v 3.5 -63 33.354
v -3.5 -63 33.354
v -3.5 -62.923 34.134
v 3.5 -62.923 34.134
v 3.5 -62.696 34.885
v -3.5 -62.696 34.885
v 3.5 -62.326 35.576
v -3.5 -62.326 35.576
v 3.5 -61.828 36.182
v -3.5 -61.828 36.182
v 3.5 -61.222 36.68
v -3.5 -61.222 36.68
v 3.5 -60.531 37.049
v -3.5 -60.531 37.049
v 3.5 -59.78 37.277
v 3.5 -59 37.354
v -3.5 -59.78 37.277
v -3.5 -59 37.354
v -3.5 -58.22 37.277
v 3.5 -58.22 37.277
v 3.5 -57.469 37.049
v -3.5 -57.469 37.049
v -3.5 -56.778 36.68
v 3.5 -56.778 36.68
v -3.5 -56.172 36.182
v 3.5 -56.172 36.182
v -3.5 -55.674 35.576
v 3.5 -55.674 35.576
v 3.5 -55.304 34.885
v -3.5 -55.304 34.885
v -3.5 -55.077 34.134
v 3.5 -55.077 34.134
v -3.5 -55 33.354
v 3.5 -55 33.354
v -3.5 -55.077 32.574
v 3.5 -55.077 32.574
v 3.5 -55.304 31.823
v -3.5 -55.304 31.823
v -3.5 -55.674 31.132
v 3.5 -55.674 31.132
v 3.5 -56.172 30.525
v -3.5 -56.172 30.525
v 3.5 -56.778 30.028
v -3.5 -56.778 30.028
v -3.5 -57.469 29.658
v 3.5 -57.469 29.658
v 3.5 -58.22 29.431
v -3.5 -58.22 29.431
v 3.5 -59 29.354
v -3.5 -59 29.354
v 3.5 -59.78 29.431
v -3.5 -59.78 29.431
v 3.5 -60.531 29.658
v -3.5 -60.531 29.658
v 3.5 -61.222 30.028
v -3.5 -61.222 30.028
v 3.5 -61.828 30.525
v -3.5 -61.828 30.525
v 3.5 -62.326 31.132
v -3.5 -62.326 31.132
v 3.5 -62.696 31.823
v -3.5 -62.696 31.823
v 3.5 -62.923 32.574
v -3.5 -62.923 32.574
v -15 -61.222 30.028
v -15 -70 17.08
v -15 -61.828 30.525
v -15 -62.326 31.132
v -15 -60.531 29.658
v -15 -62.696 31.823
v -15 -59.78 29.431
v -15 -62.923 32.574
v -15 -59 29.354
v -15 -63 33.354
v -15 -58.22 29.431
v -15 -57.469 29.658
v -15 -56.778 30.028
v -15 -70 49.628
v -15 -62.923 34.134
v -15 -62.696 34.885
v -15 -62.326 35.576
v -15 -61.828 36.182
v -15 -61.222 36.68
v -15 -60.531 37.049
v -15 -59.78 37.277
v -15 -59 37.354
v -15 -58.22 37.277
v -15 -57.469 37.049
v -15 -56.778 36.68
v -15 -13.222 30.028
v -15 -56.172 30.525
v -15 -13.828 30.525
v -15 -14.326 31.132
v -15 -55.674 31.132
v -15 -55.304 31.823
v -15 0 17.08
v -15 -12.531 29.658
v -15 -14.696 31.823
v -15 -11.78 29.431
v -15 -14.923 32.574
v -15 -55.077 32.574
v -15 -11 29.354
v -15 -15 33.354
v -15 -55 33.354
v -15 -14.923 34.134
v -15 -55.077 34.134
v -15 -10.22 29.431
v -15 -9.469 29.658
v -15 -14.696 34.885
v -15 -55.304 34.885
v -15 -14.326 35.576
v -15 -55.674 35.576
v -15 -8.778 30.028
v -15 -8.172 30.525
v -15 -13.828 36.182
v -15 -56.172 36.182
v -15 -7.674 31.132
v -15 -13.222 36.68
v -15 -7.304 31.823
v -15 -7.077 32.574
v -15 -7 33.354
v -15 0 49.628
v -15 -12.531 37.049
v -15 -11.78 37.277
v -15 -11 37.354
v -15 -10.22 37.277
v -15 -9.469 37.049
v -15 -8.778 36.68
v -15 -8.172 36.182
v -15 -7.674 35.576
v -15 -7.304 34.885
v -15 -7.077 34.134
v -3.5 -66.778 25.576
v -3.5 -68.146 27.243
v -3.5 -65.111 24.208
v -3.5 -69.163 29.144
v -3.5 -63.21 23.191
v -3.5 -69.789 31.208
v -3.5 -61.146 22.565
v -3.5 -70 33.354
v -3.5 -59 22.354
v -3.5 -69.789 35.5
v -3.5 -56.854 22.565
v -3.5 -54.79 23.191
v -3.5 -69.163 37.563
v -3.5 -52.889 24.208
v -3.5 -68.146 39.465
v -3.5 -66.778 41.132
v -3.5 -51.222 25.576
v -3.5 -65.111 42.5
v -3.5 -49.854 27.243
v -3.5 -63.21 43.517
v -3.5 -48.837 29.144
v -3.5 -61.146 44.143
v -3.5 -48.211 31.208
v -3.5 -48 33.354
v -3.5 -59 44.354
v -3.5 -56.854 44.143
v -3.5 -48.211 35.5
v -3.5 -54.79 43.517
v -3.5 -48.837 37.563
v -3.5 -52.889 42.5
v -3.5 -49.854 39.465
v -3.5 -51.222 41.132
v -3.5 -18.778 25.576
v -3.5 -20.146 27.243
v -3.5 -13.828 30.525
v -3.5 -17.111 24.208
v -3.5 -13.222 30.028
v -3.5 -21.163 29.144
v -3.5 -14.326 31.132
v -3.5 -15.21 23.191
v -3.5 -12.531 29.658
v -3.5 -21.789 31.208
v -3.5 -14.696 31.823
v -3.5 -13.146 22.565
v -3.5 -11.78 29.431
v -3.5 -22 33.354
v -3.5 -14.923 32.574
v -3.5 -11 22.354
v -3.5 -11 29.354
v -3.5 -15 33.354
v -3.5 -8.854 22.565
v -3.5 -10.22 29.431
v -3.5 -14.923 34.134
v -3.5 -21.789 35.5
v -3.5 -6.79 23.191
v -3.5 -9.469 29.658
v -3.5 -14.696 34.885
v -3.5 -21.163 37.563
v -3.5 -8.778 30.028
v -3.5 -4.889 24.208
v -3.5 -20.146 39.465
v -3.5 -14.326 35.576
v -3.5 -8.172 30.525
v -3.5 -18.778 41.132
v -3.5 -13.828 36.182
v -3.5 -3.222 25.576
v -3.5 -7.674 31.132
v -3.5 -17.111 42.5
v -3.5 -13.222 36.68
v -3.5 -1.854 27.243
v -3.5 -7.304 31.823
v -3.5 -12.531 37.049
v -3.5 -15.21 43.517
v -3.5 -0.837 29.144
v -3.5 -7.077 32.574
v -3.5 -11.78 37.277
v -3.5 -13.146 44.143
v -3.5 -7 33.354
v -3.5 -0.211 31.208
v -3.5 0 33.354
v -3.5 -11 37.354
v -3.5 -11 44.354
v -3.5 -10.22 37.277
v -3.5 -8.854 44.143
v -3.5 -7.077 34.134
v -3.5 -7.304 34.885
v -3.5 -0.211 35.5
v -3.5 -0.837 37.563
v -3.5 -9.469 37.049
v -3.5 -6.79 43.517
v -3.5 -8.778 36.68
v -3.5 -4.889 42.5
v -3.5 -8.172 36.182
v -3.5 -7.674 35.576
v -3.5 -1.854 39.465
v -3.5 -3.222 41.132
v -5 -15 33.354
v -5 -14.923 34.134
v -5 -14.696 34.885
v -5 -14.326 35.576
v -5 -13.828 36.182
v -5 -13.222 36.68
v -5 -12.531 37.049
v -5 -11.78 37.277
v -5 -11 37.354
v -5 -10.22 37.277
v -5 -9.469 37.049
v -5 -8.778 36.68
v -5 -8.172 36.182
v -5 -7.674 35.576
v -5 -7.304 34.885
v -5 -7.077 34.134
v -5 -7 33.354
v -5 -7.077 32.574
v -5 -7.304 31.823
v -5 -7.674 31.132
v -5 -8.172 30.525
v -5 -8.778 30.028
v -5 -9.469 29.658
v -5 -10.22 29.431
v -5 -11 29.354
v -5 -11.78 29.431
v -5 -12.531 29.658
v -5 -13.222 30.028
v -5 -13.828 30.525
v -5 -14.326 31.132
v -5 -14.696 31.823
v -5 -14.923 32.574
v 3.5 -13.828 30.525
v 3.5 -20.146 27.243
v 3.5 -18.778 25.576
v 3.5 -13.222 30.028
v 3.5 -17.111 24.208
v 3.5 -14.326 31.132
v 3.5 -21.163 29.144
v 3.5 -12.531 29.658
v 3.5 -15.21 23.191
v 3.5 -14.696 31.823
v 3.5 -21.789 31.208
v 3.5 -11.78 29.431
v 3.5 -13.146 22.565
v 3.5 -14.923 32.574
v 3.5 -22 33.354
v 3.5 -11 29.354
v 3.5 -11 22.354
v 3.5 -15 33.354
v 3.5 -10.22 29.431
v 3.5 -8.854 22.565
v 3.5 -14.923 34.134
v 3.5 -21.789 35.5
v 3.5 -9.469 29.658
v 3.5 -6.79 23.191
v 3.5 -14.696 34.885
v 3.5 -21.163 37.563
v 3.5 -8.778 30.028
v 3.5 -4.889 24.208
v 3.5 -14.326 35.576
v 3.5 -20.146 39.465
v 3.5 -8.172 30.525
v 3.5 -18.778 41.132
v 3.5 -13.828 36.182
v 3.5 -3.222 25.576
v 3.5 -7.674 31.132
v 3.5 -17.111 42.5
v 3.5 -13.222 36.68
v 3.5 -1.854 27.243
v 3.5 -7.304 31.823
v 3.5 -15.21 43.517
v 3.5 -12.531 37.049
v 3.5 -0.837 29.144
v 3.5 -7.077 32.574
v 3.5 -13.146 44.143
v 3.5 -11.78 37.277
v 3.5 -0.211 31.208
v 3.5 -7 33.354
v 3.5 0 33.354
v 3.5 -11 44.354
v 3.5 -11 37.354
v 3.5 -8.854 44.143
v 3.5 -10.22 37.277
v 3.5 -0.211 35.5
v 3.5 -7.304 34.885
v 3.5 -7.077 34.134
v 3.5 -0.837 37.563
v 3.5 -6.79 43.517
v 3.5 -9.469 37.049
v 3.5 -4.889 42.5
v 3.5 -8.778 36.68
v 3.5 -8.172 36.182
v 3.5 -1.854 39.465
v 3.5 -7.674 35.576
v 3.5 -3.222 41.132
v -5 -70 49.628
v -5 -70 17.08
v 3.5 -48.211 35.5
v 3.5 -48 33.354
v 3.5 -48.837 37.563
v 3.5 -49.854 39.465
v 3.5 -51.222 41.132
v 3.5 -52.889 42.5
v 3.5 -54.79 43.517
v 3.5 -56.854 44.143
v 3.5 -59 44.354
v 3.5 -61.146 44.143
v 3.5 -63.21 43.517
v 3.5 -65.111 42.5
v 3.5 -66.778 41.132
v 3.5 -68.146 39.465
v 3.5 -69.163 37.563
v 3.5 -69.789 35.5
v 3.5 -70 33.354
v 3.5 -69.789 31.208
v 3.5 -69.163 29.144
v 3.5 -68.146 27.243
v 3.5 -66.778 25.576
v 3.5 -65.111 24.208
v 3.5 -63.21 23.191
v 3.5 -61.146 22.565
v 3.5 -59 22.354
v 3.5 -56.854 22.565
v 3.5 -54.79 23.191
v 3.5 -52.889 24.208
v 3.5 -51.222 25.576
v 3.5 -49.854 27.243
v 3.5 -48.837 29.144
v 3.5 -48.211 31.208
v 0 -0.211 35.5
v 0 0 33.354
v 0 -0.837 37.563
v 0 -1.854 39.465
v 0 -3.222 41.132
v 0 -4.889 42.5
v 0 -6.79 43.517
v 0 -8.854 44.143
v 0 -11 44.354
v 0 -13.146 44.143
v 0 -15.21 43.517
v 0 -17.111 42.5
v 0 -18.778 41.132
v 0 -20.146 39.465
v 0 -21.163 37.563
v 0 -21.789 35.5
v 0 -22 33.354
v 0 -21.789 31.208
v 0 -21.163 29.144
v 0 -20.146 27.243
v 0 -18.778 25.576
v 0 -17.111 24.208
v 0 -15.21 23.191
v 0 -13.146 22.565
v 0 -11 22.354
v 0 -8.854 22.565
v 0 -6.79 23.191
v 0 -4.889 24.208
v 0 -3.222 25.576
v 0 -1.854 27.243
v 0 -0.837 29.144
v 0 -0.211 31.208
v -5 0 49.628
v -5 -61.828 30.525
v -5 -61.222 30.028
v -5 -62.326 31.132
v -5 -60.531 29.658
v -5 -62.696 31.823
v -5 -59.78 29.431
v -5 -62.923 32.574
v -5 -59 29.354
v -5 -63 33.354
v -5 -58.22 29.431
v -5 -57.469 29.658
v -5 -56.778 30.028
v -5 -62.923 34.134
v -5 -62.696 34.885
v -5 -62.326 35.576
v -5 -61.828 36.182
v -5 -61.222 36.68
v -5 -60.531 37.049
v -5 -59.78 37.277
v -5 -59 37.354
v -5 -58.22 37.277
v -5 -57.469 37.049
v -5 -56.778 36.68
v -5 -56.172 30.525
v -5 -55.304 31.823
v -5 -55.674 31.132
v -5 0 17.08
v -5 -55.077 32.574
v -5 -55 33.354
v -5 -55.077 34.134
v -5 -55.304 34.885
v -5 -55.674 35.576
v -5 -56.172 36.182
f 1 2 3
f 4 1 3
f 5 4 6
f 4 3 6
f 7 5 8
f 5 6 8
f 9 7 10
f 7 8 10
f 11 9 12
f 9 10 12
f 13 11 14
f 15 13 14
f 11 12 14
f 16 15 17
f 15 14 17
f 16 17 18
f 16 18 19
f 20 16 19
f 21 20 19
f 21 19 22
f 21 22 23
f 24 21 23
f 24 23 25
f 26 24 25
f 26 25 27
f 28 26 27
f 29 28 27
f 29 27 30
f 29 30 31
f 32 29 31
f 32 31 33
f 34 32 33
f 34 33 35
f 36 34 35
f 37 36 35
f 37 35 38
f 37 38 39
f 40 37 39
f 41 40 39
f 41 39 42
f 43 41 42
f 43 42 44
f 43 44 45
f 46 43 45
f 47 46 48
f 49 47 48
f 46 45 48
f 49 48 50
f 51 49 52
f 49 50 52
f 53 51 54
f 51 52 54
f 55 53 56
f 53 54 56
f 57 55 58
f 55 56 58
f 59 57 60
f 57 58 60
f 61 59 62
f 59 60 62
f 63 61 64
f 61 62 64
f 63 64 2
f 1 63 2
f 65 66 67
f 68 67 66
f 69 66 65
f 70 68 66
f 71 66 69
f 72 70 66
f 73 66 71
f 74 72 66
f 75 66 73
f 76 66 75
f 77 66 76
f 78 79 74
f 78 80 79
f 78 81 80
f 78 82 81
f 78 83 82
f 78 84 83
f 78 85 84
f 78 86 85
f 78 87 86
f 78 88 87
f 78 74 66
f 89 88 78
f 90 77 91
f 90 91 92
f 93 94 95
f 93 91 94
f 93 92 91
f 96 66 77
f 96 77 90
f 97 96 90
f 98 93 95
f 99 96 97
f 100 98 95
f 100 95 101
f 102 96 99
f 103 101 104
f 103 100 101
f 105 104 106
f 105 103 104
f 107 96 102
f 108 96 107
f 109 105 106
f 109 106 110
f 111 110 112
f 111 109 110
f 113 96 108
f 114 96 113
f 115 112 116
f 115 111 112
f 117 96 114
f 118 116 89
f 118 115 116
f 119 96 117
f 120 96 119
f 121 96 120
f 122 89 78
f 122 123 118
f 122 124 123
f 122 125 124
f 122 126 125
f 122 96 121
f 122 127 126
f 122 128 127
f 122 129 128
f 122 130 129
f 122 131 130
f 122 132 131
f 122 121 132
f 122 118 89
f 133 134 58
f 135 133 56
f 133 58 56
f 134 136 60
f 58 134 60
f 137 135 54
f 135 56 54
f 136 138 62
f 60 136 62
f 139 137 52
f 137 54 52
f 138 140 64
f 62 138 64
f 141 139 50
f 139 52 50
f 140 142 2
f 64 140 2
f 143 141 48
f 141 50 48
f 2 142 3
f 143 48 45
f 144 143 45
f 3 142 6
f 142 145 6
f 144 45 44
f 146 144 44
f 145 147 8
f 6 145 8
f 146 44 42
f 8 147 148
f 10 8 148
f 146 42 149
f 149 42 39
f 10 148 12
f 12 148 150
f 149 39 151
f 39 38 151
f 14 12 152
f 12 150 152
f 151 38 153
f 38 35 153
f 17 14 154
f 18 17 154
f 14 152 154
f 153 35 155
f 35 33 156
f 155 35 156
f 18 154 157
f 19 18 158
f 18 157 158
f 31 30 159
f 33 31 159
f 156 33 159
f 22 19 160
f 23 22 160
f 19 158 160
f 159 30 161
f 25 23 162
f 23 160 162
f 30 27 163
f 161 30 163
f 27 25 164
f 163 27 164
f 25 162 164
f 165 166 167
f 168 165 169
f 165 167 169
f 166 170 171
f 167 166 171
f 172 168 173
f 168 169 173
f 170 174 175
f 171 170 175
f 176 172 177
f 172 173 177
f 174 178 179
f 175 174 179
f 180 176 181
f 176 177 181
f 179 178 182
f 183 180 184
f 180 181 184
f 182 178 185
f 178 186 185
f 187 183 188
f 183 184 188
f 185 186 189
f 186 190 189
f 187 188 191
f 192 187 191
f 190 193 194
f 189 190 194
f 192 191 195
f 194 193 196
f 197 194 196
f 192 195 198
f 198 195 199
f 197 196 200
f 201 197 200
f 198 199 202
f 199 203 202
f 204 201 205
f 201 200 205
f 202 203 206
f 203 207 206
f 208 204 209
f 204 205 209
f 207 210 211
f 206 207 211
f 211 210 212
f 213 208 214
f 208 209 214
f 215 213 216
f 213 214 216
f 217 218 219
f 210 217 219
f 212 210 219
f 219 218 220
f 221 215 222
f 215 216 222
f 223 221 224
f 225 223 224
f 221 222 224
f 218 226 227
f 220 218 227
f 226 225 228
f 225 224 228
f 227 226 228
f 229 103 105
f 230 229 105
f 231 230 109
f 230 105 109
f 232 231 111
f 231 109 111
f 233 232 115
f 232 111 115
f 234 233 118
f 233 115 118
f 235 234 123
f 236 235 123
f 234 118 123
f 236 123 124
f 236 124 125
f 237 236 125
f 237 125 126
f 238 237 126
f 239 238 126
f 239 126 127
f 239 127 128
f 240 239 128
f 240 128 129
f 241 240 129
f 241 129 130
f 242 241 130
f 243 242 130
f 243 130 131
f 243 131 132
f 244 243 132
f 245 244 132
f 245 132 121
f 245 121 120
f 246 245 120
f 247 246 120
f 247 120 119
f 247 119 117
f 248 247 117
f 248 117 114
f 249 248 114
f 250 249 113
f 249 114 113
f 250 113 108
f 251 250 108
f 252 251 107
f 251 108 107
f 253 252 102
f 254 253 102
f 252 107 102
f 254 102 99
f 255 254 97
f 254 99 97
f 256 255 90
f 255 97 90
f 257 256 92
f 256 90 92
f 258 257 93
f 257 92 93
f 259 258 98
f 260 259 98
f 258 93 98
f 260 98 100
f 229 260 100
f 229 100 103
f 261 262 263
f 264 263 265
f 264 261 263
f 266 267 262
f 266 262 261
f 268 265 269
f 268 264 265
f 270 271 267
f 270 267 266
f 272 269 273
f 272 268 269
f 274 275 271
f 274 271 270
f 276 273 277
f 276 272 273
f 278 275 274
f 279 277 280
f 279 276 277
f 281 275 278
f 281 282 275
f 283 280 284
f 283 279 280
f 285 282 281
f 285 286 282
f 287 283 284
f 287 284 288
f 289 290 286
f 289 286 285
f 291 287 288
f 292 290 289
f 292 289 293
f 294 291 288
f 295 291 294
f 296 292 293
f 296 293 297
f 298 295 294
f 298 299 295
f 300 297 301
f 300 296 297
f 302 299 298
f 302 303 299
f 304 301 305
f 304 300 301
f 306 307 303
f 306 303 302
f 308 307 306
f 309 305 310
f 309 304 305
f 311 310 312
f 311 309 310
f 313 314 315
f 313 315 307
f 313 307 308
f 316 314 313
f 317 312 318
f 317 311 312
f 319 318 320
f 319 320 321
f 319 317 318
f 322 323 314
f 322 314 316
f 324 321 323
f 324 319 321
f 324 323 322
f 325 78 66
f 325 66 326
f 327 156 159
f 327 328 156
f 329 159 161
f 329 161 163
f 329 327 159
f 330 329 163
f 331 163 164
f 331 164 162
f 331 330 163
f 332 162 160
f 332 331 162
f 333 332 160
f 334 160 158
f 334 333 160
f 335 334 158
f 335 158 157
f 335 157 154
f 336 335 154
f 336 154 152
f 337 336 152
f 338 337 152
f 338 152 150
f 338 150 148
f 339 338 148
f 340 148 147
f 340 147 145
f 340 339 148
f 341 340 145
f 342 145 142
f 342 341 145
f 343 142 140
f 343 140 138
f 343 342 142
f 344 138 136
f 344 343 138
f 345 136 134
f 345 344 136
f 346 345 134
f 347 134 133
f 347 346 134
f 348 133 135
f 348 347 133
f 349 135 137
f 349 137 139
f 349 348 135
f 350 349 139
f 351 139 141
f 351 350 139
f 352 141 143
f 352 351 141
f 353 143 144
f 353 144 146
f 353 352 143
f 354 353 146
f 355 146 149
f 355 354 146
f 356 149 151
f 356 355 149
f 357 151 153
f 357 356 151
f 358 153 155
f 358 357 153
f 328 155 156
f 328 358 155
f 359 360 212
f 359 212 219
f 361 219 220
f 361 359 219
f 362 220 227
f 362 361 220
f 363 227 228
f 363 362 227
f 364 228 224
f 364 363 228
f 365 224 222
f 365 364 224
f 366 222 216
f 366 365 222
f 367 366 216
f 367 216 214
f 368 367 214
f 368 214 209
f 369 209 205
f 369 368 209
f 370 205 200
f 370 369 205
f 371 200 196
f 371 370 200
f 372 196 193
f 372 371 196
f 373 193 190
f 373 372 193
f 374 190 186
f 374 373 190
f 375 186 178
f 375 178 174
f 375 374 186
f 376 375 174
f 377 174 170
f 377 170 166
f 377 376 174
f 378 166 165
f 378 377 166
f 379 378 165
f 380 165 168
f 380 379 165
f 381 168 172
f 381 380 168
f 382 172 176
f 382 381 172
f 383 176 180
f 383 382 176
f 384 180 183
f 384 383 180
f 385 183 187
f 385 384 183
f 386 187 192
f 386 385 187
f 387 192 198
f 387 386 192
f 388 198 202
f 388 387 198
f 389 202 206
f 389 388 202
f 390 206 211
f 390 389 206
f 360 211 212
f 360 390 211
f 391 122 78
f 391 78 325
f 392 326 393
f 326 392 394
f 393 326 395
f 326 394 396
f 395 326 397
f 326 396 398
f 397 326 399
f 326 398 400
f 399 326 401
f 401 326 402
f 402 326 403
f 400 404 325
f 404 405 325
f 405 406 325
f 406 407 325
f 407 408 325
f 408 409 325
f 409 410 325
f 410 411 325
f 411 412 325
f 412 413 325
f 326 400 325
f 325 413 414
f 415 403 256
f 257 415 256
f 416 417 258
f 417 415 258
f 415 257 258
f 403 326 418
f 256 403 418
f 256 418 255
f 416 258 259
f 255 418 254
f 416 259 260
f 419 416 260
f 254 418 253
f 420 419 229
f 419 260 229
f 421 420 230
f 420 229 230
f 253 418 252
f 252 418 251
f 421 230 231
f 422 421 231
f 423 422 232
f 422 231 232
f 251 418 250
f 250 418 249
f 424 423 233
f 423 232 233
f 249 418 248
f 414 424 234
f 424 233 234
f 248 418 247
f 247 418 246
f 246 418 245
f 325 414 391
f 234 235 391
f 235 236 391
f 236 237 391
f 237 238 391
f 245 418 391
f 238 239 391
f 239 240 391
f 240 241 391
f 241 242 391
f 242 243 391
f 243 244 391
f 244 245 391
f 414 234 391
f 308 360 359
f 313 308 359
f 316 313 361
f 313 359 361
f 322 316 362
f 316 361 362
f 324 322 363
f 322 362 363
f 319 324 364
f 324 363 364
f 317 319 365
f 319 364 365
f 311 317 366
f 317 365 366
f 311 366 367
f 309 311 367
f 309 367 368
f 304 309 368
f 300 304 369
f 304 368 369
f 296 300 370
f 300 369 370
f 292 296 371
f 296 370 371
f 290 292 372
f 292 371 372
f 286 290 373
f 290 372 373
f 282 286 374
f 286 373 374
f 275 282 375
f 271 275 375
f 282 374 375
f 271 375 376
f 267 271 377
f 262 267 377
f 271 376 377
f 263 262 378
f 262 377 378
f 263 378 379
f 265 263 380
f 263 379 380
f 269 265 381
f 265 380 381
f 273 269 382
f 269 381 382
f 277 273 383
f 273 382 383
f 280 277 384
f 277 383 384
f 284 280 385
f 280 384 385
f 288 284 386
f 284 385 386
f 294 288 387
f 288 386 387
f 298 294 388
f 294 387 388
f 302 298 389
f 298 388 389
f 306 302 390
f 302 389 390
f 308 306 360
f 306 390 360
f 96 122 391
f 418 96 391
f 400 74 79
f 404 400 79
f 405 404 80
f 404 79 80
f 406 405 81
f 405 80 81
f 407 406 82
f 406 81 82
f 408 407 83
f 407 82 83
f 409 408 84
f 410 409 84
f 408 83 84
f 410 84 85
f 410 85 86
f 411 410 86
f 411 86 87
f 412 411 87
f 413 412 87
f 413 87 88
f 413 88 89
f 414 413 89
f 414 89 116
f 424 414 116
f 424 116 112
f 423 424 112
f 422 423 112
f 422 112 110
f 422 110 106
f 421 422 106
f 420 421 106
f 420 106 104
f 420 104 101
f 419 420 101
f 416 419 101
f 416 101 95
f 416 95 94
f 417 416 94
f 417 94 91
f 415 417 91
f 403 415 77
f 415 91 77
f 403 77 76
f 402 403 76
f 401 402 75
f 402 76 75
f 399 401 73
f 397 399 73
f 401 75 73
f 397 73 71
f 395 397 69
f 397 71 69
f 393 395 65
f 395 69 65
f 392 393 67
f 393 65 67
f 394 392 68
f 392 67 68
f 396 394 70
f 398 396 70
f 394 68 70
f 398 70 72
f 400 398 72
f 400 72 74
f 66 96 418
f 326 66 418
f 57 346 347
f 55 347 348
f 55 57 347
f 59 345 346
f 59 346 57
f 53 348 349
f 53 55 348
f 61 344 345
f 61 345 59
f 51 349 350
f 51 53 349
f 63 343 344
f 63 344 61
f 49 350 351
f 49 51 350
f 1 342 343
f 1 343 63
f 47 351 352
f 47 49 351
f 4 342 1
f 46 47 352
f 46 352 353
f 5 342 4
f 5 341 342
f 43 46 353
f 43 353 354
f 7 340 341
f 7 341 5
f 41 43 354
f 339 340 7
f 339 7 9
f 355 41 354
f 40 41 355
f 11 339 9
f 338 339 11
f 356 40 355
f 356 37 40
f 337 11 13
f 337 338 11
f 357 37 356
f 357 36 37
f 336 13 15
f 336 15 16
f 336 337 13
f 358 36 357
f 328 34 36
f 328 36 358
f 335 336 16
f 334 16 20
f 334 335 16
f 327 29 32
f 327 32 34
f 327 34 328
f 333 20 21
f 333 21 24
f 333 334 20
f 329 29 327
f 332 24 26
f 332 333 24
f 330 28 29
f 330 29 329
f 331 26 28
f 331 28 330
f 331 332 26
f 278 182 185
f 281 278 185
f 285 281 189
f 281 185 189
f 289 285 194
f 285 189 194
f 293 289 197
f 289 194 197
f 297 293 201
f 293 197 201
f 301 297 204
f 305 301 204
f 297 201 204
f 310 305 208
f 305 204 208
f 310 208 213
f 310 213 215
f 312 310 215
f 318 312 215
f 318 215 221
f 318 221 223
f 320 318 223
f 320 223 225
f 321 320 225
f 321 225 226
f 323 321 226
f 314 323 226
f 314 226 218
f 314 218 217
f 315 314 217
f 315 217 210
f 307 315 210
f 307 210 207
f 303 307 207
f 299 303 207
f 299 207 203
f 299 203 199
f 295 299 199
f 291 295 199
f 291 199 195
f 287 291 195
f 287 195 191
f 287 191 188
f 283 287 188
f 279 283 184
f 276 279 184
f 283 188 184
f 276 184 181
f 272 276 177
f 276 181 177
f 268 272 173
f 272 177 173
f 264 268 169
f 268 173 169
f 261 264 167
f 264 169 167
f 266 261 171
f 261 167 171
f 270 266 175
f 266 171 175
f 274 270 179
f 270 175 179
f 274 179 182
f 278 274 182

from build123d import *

# Parameters (mm, degrees)
F0_W     = 10
F0_H     = 32.547483
F1_DEPTH = 70
F2_R     = 11
F3_DEPTH = 3.5
F4_R     = 4
F5_DEPTH = 18.501


with BuildPart() as f1:
    # F0 (on Front) → F1 (new body)
    with BuildSketch(Plane.XZ):
        with Locations((-10, 33.353868)):
            Rectangle(F0_W, F0_H)
    extrude(amount=F1_DEPTH)


with BuildPart() as f3:
    # F2 (on Right) → F3 (new body, symmetric)
    with BuildSketch(Plane.YZ):
        with Locations((-11, 33.353868)):
            Circle(F2_R)
        with Locations((-59, 33.353868)):
            Circle(F2_R)
    extrude(amount=F3_DEPTH, both=True)


with BuildPart() as f5_tool:
    # F4 (on face) → F5 (new body, through all)
    with BuildSketch(Plane(origin=(-15, 0, 0), x_dir=(0, -1, 0), z_dir=(-1, 0, 0))):
        with Locations((11, 33.353868)):
            Circle(F4_R)
        with Locations((59, 33.353868)):
            Circle(F4_R)
    extrude(amount=-F5_DEPTH)


with BuildPart() as f1_1:
    add(f1.part)

    # F5: cut by f5_tool
    add(f5_tool.part, mode=Mode.SUBTRACT)


with BuildPart() as f3_1:
    add(f3.part)

    # F5: cut by f5_tool
    add(f5_tool.part, mode=Mode.SUBTRACT)


solid = Compound([f1_1.part, f3_1.part])
